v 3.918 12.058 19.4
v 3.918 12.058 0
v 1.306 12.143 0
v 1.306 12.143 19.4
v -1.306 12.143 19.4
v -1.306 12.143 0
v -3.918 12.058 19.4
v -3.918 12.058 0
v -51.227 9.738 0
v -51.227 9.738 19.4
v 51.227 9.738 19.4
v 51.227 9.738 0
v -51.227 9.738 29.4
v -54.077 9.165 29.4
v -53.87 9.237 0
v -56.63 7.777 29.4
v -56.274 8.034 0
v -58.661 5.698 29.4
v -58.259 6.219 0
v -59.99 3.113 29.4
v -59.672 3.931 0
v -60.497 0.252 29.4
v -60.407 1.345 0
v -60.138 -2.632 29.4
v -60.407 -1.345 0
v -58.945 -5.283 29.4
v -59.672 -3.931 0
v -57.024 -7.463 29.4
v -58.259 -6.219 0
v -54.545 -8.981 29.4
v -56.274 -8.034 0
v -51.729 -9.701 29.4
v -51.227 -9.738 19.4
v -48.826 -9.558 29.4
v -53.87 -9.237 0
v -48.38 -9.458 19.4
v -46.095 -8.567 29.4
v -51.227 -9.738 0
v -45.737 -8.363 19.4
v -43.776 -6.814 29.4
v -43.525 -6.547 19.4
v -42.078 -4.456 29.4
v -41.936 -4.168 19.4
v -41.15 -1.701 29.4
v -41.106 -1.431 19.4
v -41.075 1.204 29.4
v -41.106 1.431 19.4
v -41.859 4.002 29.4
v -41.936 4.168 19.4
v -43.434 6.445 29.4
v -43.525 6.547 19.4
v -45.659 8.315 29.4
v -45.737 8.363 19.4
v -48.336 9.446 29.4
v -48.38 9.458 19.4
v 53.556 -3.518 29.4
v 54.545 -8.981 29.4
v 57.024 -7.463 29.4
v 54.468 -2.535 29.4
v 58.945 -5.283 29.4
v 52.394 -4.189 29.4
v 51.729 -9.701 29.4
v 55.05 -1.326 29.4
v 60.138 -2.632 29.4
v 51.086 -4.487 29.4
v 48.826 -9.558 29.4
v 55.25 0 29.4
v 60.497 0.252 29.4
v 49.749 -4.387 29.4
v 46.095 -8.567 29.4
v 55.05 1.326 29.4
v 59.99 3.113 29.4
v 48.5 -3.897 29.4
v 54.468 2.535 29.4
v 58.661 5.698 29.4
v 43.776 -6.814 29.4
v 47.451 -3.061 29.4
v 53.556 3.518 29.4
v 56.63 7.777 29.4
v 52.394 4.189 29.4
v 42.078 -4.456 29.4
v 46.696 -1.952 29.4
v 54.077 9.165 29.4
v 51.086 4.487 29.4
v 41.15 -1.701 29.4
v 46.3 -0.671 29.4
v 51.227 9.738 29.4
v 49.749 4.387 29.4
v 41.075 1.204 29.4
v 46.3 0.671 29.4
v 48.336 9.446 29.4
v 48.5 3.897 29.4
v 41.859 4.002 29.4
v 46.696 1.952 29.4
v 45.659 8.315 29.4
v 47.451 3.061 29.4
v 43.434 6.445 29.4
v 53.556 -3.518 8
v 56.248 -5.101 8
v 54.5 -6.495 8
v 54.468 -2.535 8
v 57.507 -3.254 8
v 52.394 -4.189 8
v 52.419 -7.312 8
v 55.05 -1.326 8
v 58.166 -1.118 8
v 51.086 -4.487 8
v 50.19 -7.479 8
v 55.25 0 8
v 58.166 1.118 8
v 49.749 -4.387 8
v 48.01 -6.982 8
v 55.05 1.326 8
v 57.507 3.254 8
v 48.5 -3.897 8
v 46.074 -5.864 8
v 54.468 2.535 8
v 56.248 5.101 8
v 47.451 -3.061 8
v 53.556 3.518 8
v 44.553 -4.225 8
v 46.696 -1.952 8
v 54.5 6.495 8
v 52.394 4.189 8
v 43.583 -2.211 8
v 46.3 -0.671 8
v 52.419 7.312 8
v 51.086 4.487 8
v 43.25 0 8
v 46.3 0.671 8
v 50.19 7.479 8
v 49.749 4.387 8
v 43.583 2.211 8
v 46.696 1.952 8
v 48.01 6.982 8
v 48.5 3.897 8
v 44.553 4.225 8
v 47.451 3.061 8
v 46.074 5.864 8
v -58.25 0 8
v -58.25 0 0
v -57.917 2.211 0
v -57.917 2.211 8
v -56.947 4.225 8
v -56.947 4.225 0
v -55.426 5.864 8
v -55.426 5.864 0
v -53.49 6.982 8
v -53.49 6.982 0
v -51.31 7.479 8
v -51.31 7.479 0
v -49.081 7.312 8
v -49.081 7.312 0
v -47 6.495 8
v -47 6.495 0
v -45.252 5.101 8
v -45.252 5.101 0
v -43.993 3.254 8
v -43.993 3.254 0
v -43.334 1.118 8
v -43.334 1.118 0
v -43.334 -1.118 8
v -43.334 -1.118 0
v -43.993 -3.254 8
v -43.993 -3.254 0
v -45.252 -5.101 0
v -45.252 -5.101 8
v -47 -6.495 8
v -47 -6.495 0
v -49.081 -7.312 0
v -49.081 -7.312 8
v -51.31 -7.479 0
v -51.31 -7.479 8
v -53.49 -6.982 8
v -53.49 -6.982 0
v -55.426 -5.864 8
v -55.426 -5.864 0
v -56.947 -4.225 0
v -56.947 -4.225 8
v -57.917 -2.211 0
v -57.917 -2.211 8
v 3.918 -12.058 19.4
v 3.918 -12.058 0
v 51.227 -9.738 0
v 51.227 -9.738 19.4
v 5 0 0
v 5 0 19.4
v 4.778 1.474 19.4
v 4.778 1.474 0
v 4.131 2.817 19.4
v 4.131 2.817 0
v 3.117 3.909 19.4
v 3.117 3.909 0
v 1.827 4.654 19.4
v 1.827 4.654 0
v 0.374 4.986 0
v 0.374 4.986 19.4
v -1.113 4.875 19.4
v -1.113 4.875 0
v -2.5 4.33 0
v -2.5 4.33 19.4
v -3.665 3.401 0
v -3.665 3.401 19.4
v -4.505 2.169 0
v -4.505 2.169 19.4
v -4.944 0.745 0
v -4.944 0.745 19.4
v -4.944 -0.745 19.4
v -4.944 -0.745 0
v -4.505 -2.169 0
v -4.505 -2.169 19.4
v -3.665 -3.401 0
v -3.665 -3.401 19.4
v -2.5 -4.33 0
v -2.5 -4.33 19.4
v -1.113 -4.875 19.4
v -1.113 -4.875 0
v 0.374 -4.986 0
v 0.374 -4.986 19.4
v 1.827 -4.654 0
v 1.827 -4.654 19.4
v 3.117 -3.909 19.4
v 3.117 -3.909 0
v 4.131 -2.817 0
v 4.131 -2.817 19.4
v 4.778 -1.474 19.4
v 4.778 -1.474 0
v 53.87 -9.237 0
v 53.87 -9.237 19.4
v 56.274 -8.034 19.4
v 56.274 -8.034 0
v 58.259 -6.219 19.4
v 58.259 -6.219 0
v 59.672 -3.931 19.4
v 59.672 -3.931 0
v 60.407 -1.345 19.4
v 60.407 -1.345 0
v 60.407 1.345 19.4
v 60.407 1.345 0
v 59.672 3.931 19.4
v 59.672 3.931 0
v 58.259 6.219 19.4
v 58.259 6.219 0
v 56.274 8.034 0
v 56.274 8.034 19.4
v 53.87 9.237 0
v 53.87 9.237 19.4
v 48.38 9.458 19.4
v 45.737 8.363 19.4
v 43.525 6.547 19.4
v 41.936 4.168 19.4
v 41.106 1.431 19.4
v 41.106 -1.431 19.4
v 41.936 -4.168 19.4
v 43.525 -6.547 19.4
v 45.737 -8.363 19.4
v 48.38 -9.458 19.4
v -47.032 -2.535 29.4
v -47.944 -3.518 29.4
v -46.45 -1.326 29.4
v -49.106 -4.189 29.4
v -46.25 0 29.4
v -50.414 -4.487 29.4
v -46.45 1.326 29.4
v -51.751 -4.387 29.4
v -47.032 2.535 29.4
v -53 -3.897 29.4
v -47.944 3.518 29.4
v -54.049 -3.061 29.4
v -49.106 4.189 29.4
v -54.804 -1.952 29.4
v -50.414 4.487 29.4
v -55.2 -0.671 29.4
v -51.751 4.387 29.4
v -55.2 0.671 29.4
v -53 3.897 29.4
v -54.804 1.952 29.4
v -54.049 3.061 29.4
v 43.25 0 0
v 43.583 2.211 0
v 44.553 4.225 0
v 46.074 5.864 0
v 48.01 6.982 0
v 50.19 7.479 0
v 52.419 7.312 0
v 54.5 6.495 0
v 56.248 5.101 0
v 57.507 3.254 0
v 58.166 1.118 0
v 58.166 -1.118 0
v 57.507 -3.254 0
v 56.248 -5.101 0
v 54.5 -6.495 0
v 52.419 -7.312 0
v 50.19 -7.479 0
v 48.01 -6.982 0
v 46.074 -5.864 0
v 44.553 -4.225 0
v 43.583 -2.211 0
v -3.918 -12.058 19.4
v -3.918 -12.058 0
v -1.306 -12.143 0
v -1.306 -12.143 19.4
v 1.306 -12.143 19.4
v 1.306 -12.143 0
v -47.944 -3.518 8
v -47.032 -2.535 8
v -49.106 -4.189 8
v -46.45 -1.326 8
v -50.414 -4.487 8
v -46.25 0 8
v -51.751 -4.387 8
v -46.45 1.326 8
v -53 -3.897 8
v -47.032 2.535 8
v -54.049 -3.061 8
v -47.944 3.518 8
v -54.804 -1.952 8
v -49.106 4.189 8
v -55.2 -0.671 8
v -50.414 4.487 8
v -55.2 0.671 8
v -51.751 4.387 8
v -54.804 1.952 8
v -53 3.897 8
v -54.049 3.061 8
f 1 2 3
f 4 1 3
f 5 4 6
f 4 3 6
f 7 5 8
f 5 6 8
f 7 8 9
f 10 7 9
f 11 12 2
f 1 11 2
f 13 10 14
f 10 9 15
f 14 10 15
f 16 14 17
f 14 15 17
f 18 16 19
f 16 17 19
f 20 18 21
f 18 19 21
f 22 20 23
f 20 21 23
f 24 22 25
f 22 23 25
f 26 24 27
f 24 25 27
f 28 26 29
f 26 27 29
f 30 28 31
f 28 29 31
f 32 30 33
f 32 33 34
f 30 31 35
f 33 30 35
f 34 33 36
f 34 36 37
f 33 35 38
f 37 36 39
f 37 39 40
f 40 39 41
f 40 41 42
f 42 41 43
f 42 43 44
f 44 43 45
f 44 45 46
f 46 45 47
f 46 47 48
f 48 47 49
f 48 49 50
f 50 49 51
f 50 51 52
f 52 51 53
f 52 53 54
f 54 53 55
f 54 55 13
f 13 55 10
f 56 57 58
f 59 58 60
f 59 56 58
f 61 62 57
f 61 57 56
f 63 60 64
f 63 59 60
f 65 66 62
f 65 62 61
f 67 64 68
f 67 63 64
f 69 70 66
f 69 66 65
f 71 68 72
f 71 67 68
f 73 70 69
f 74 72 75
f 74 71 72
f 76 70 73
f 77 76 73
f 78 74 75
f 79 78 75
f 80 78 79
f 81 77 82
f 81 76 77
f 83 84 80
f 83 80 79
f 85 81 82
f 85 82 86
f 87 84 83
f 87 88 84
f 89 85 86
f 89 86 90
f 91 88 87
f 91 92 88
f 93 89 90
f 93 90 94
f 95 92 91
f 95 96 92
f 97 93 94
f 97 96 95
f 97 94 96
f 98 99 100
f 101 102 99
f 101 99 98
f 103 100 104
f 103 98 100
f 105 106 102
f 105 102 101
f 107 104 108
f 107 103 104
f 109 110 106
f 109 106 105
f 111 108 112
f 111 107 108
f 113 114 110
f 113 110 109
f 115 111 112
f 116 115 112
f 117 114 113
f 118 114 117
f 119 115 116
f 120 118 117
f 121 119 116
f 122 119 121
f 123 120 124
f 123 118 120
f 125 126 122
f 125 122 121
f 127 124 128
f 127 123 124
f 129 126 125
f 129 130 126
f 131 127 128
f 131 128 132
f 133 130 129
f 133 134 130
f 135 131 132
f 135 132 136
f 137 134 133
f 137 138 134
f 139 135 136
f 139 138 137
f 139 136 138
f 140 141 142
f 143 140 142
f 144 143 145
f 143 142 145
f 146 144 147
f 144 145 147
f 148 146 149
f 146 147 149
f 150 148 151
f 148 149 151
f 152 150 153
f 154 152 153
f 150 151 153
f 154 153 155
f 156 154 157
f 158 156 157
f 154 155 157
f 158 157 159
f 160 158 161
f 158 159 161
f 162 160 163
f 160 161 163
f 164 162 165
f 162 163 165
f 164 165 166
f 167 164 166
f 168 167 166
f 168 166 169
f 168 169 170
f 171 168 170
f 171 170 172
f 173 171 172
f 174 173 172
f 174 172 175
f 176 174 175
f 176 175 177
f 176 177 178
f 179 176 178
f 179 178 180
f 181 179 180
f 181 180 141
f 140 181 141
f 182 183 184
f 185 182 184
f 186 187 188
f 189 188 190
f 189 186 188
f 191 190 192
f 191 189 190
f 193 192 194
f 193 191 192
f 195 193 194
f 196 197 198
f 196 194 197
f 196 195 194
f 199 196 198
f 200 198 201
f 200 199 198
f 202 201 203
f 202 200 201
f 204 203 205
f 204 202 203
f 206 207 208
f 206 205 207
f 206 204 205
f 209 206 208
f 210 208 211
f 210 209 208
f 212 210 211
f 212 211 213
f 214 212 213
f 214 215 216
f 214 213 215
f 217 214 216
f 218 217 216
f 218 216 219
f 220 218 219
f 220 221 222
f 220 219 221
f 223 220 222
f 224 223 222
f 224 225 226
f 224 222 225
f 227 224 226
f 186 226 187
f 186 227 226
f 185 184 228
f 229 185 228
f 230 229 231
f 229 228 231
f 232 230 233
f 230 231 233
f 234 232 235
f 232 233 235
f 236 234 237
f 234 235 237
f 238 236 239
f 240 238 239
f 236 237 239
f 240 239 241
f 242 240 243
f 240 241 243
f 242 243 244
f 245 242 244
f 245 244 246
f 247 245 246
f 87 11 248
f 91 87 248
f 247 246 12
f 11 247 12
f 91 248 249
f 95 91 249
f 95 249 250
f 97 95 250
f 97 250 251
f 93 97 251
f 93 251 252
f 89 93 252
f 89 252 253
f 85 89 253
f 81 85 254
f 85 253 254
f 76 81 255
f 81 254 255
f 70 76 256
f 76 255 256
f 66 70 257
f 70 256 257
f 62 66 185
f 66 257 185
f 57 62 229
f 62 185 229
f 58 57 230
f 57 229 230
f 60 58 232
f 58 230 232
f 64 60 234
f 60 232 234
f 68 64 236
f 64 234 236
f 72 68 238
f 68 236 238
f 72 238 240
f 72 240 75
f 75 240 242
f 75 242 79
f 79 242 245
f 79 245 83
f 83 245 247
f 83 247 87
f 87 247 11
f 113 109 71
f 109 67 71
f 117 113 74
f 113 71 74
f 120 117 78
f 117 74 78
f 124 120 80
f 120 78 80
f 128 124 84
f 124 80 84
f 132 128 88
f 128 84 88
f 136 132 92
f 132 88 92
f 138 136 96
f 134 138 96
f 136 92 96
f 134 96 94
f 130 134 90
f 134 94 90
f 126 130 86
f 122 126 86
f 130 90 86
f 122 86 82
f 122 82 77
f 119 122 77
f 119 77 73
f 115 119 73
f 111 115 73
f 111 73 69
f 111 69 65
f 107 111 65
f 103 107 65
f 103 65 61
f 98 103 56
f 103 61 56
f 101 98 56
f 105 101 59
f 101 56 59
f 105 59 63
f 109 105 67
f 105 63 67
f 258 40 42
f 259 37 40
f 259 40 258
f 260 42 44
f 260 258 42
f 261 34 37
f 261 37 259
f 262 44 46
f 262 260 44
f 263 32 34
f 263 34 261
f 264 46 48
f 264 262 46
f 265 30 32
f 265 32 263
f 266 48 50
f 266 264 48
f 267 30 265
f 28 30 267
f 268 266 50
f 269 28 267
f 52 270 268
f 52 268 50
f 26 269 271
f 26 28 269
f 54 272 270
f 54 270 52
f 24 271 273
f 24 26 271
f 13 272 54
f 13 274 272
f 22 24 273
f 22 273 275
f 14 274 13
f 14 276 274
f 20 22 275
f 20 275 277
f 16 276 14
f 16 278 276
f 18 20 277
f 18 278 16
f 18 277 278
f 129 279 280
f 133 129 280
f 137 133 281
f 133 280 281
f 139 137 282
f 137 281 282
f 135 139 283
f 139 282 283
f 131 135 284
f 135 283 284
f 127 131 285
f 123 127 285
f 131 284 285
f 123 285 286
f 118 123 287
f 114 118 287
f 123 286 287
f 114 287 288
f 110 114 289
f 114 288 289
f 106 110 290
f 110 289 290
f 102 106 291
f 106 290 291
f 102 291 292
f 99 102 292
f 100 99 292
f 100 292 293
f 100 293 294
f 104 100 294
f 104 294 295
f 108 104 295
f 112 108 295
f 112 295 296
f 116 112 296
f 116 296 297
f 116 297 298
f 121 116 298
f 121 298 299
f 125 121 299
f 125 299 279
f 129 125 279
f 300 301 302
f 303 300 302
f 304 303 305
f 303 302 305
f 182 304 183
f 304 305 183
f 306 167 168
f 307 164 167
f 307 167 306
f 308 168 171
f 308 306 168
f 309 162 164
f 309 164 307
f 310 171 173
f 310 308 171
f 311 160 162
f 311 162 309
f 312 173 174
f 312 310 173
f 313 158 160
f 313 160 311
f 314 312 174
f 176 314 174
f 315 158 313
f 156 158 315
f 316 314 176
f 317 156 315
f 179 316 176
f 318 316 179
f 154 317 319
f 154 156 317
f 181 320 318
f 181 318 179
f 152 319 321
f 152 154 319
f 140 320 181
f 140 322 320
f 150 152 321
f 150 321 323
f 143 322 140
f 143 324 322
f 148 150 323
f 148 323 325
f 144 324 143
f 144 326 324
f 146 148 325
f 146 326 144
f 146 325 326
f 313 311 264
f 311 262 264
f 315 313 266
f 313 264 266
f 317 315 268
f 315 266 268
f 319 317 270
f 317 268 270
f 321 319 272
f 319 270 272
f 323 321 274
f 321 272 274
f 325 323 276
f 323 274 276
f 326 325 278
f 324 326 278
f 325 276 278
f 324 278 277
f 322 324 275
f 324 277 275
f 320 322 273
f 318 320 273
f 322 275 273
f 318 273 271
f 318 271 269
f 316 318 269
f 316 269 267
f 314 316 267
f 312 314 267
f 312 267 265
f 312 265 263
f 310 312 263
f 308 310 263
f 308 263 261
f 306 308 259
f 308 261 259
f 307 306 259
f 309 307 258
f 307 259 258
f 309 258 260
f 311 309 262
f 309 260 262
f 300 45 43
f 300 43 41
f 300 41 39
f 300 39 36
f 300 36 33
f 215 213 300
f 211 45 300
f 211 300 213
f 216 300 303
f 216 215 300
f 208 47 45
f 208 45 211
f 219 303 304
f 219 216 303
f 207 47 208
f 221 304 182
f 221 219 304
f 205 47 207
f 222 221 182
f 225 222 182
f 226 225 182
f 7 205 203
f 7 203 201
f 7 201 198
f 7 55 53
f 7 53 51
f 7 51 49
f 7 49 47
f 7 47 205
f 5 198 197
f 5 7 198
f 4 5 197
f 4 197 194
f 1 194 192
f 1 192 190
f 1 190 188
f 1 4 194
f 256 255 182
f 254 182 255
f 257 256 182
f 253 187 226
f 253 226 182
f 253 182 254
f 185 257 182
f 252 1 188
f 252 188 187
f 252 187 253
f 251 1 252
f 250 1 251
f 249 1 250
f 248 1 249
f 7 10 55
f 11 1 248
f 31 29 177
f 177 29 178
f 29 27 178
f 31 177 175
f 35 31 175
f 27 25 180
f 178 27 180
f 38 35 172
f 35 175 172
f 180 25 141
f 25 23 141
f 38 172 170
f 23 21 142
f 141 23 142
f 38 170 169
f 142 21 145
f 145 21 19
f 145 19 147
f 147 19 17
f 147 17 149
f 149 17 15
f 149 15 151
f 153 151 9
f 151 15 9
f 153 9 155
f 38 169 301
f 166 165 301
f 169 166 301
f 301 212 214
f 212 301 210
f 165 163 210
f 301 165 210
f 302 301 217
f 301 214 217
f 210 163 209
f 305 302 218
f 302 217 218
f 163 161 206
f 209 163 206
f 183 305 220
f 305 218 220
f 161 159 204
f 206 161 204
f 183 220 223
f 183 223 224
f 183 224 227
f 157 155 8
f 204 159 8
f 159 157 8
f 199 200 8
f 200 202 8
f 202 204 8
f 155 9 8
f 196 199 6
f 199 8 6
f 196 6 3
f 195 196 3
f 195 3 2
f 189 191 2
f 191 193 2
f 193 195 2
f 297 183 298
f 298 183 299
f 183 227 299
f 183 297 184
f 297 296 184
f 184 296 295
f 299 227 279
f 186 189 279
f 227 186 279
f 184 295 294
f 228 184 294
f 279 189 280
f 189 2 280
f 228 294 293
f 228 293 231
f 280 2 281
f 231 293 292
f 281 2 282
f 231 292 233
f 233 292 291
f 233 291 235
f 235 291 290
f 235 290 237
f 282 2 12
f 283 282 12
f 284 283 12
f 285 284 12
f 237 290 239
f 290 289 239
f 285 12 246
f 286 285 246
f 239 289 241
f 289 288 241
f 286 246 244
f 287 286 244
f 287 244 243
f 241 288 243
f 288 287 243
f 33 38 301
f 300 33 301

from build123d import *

# Parameters (mm, degrees)
SKETCH_1_R                   = 9.75
EXTRUDE_1_DEPTH              = 19.4
SKETCH_1_3_R                 = 9.75
EXTRUDE_2_DEPTH              = 29.4
SKETCH_2_R                   = 5
CUT_EXTRUDE_1_DEPTH          = 69.371576697
FILLET_1_R                   = 80
HOLE_WIZARD_M8_1_D           = 9
HOLE_WIZARD_M8_1_CBORE_D     = 15
HOLE_WIZARD_M8_1_CBORE_DEPTH = 8


with BuildPart() as part:
    # 스케치1 → 보스-돌출1 (new body)
    with BuildSketch(Plane.XY):
        with Locations((-50.75, 0)):
            Circle(SKETCH_1_R)
        with BuildLine():
            Line((-51.227471847, -9.738301733), (0, -12.25))
            Line((0, -12.25), (0, 12.25))
            Line((0, 12.25), (-51.227471847, 9.738301733))
            ThreePointArc((-51.227471847, 9.738301733), (-44.026639624, 7.061085274), (-41, 0))
            ThreePointArc((-41, 0), (-44.026639624, -7.061085274), (-51.227471847, -9.738301733))
        make_face()
        with BuildLine():
            Line((0, 12.25), (0, -12.25))
            Line((0, -12.25), (51.227471847, -9.738301733))
            ThreePointArc((51.227471847, -9.738301733), (41, 0), (51.227471847, 9.738301733))
            Line((51.227471847, 9.738301733), (0, 12.25))
        make_face()
        with Locations((50.75, 0)):
            Circle(SKETCH_1_R)
    extrude(amount=EXTRUDE_1_DEPTH)

    # 스케치1<3> → 보스-돌출2 (add)
    with BuildSketch(Plane.XY):
        with Locations(Location((-50.75, 0, 0), (0, 0, 92.806981348))):
            Circle(SKETCH_1_3_R)
        with Locations(Location((50.75, 0, 0), (0, 0, 87.193018652))):
            Circle(SKETCH_1_3_R)
    extrude(amount=EXTRUDE_2_DEPTH)

    # 스케치2 → 컷-돌출1 (cut, through all)
    with BuildSketch(Plane.XY):
        Circle(SKETCH_2_R)
    extrude(amount=CUT_EXTRUDE_1_DEPTH, mode=Mode.SUBTRACT)

    # 필렛1
    # the kernel refuses this fillet: 80 mm, written as the material it takes off along each edge
    with BuildSketch(Plane(origin=(0, 12.25, -9.806059822), x_dir=(0.9988001777044758, -0.048971471465613654, 0), z_dir=(0, 0, 1))) as fillet_1_piece_1:
        with BuildLine():
            CenterArc((FILLET_1_R * 0.0490302991116, -FILLET_1_R), FILLET_1_R, 90, 5.613962695)
            Line((-FILLET_1_R * 0.048795129693, -FILLET_1_R * 0.00479641003501), (0, 0))
            Line((0, 0), (FILLET_1_R * 0.0490302991116, 0))
        make_face()
    extrude(amount=39.012119645, mode=Mode.SUBTRACT)
    with BuildSketch(Plane(origin=(0, -12.25, -9.806059822), x_dir=(0.9988001777044758, 0.0489714714656137, 0), z_dir=(0, 0, 1))) as fillet_1_piece_2:
        with BuildLine():
            CenterArc((FILLET_1_R * 0.0490302991116, FILLET_1_R), FILLET_1_R, 264.386037305, 5.613962695)
            Line((-FILLET_1_R * 0.048795129693, FILLET_1_R * 0.00479641003501), (0, 0))
            Line((0, 0), (FILLET_1_R * 0.0490302991116, 0))
        make_face()
    extrude(amount=39.012119645, mode=Mode.SUBTRACT)

    # M8 소켓 머리 캡 나사용 카운터보어1 (through all)
    with Locations(Plane(origin=(0, 0, 0), x_dir=(-1, 0, 0), z_dir=(0, 0, -1))):
        with Locations((-50.75, 0), (50.75, 0)):
            CounterBoreHole(HOLE_WIZARD_M8_1_D / 2, HOLE_WIZARD_M8_1_CBORE_D / 2, HOLE_WIZARD_M8_1_CBORE_DEPTH)


solid = part.part
